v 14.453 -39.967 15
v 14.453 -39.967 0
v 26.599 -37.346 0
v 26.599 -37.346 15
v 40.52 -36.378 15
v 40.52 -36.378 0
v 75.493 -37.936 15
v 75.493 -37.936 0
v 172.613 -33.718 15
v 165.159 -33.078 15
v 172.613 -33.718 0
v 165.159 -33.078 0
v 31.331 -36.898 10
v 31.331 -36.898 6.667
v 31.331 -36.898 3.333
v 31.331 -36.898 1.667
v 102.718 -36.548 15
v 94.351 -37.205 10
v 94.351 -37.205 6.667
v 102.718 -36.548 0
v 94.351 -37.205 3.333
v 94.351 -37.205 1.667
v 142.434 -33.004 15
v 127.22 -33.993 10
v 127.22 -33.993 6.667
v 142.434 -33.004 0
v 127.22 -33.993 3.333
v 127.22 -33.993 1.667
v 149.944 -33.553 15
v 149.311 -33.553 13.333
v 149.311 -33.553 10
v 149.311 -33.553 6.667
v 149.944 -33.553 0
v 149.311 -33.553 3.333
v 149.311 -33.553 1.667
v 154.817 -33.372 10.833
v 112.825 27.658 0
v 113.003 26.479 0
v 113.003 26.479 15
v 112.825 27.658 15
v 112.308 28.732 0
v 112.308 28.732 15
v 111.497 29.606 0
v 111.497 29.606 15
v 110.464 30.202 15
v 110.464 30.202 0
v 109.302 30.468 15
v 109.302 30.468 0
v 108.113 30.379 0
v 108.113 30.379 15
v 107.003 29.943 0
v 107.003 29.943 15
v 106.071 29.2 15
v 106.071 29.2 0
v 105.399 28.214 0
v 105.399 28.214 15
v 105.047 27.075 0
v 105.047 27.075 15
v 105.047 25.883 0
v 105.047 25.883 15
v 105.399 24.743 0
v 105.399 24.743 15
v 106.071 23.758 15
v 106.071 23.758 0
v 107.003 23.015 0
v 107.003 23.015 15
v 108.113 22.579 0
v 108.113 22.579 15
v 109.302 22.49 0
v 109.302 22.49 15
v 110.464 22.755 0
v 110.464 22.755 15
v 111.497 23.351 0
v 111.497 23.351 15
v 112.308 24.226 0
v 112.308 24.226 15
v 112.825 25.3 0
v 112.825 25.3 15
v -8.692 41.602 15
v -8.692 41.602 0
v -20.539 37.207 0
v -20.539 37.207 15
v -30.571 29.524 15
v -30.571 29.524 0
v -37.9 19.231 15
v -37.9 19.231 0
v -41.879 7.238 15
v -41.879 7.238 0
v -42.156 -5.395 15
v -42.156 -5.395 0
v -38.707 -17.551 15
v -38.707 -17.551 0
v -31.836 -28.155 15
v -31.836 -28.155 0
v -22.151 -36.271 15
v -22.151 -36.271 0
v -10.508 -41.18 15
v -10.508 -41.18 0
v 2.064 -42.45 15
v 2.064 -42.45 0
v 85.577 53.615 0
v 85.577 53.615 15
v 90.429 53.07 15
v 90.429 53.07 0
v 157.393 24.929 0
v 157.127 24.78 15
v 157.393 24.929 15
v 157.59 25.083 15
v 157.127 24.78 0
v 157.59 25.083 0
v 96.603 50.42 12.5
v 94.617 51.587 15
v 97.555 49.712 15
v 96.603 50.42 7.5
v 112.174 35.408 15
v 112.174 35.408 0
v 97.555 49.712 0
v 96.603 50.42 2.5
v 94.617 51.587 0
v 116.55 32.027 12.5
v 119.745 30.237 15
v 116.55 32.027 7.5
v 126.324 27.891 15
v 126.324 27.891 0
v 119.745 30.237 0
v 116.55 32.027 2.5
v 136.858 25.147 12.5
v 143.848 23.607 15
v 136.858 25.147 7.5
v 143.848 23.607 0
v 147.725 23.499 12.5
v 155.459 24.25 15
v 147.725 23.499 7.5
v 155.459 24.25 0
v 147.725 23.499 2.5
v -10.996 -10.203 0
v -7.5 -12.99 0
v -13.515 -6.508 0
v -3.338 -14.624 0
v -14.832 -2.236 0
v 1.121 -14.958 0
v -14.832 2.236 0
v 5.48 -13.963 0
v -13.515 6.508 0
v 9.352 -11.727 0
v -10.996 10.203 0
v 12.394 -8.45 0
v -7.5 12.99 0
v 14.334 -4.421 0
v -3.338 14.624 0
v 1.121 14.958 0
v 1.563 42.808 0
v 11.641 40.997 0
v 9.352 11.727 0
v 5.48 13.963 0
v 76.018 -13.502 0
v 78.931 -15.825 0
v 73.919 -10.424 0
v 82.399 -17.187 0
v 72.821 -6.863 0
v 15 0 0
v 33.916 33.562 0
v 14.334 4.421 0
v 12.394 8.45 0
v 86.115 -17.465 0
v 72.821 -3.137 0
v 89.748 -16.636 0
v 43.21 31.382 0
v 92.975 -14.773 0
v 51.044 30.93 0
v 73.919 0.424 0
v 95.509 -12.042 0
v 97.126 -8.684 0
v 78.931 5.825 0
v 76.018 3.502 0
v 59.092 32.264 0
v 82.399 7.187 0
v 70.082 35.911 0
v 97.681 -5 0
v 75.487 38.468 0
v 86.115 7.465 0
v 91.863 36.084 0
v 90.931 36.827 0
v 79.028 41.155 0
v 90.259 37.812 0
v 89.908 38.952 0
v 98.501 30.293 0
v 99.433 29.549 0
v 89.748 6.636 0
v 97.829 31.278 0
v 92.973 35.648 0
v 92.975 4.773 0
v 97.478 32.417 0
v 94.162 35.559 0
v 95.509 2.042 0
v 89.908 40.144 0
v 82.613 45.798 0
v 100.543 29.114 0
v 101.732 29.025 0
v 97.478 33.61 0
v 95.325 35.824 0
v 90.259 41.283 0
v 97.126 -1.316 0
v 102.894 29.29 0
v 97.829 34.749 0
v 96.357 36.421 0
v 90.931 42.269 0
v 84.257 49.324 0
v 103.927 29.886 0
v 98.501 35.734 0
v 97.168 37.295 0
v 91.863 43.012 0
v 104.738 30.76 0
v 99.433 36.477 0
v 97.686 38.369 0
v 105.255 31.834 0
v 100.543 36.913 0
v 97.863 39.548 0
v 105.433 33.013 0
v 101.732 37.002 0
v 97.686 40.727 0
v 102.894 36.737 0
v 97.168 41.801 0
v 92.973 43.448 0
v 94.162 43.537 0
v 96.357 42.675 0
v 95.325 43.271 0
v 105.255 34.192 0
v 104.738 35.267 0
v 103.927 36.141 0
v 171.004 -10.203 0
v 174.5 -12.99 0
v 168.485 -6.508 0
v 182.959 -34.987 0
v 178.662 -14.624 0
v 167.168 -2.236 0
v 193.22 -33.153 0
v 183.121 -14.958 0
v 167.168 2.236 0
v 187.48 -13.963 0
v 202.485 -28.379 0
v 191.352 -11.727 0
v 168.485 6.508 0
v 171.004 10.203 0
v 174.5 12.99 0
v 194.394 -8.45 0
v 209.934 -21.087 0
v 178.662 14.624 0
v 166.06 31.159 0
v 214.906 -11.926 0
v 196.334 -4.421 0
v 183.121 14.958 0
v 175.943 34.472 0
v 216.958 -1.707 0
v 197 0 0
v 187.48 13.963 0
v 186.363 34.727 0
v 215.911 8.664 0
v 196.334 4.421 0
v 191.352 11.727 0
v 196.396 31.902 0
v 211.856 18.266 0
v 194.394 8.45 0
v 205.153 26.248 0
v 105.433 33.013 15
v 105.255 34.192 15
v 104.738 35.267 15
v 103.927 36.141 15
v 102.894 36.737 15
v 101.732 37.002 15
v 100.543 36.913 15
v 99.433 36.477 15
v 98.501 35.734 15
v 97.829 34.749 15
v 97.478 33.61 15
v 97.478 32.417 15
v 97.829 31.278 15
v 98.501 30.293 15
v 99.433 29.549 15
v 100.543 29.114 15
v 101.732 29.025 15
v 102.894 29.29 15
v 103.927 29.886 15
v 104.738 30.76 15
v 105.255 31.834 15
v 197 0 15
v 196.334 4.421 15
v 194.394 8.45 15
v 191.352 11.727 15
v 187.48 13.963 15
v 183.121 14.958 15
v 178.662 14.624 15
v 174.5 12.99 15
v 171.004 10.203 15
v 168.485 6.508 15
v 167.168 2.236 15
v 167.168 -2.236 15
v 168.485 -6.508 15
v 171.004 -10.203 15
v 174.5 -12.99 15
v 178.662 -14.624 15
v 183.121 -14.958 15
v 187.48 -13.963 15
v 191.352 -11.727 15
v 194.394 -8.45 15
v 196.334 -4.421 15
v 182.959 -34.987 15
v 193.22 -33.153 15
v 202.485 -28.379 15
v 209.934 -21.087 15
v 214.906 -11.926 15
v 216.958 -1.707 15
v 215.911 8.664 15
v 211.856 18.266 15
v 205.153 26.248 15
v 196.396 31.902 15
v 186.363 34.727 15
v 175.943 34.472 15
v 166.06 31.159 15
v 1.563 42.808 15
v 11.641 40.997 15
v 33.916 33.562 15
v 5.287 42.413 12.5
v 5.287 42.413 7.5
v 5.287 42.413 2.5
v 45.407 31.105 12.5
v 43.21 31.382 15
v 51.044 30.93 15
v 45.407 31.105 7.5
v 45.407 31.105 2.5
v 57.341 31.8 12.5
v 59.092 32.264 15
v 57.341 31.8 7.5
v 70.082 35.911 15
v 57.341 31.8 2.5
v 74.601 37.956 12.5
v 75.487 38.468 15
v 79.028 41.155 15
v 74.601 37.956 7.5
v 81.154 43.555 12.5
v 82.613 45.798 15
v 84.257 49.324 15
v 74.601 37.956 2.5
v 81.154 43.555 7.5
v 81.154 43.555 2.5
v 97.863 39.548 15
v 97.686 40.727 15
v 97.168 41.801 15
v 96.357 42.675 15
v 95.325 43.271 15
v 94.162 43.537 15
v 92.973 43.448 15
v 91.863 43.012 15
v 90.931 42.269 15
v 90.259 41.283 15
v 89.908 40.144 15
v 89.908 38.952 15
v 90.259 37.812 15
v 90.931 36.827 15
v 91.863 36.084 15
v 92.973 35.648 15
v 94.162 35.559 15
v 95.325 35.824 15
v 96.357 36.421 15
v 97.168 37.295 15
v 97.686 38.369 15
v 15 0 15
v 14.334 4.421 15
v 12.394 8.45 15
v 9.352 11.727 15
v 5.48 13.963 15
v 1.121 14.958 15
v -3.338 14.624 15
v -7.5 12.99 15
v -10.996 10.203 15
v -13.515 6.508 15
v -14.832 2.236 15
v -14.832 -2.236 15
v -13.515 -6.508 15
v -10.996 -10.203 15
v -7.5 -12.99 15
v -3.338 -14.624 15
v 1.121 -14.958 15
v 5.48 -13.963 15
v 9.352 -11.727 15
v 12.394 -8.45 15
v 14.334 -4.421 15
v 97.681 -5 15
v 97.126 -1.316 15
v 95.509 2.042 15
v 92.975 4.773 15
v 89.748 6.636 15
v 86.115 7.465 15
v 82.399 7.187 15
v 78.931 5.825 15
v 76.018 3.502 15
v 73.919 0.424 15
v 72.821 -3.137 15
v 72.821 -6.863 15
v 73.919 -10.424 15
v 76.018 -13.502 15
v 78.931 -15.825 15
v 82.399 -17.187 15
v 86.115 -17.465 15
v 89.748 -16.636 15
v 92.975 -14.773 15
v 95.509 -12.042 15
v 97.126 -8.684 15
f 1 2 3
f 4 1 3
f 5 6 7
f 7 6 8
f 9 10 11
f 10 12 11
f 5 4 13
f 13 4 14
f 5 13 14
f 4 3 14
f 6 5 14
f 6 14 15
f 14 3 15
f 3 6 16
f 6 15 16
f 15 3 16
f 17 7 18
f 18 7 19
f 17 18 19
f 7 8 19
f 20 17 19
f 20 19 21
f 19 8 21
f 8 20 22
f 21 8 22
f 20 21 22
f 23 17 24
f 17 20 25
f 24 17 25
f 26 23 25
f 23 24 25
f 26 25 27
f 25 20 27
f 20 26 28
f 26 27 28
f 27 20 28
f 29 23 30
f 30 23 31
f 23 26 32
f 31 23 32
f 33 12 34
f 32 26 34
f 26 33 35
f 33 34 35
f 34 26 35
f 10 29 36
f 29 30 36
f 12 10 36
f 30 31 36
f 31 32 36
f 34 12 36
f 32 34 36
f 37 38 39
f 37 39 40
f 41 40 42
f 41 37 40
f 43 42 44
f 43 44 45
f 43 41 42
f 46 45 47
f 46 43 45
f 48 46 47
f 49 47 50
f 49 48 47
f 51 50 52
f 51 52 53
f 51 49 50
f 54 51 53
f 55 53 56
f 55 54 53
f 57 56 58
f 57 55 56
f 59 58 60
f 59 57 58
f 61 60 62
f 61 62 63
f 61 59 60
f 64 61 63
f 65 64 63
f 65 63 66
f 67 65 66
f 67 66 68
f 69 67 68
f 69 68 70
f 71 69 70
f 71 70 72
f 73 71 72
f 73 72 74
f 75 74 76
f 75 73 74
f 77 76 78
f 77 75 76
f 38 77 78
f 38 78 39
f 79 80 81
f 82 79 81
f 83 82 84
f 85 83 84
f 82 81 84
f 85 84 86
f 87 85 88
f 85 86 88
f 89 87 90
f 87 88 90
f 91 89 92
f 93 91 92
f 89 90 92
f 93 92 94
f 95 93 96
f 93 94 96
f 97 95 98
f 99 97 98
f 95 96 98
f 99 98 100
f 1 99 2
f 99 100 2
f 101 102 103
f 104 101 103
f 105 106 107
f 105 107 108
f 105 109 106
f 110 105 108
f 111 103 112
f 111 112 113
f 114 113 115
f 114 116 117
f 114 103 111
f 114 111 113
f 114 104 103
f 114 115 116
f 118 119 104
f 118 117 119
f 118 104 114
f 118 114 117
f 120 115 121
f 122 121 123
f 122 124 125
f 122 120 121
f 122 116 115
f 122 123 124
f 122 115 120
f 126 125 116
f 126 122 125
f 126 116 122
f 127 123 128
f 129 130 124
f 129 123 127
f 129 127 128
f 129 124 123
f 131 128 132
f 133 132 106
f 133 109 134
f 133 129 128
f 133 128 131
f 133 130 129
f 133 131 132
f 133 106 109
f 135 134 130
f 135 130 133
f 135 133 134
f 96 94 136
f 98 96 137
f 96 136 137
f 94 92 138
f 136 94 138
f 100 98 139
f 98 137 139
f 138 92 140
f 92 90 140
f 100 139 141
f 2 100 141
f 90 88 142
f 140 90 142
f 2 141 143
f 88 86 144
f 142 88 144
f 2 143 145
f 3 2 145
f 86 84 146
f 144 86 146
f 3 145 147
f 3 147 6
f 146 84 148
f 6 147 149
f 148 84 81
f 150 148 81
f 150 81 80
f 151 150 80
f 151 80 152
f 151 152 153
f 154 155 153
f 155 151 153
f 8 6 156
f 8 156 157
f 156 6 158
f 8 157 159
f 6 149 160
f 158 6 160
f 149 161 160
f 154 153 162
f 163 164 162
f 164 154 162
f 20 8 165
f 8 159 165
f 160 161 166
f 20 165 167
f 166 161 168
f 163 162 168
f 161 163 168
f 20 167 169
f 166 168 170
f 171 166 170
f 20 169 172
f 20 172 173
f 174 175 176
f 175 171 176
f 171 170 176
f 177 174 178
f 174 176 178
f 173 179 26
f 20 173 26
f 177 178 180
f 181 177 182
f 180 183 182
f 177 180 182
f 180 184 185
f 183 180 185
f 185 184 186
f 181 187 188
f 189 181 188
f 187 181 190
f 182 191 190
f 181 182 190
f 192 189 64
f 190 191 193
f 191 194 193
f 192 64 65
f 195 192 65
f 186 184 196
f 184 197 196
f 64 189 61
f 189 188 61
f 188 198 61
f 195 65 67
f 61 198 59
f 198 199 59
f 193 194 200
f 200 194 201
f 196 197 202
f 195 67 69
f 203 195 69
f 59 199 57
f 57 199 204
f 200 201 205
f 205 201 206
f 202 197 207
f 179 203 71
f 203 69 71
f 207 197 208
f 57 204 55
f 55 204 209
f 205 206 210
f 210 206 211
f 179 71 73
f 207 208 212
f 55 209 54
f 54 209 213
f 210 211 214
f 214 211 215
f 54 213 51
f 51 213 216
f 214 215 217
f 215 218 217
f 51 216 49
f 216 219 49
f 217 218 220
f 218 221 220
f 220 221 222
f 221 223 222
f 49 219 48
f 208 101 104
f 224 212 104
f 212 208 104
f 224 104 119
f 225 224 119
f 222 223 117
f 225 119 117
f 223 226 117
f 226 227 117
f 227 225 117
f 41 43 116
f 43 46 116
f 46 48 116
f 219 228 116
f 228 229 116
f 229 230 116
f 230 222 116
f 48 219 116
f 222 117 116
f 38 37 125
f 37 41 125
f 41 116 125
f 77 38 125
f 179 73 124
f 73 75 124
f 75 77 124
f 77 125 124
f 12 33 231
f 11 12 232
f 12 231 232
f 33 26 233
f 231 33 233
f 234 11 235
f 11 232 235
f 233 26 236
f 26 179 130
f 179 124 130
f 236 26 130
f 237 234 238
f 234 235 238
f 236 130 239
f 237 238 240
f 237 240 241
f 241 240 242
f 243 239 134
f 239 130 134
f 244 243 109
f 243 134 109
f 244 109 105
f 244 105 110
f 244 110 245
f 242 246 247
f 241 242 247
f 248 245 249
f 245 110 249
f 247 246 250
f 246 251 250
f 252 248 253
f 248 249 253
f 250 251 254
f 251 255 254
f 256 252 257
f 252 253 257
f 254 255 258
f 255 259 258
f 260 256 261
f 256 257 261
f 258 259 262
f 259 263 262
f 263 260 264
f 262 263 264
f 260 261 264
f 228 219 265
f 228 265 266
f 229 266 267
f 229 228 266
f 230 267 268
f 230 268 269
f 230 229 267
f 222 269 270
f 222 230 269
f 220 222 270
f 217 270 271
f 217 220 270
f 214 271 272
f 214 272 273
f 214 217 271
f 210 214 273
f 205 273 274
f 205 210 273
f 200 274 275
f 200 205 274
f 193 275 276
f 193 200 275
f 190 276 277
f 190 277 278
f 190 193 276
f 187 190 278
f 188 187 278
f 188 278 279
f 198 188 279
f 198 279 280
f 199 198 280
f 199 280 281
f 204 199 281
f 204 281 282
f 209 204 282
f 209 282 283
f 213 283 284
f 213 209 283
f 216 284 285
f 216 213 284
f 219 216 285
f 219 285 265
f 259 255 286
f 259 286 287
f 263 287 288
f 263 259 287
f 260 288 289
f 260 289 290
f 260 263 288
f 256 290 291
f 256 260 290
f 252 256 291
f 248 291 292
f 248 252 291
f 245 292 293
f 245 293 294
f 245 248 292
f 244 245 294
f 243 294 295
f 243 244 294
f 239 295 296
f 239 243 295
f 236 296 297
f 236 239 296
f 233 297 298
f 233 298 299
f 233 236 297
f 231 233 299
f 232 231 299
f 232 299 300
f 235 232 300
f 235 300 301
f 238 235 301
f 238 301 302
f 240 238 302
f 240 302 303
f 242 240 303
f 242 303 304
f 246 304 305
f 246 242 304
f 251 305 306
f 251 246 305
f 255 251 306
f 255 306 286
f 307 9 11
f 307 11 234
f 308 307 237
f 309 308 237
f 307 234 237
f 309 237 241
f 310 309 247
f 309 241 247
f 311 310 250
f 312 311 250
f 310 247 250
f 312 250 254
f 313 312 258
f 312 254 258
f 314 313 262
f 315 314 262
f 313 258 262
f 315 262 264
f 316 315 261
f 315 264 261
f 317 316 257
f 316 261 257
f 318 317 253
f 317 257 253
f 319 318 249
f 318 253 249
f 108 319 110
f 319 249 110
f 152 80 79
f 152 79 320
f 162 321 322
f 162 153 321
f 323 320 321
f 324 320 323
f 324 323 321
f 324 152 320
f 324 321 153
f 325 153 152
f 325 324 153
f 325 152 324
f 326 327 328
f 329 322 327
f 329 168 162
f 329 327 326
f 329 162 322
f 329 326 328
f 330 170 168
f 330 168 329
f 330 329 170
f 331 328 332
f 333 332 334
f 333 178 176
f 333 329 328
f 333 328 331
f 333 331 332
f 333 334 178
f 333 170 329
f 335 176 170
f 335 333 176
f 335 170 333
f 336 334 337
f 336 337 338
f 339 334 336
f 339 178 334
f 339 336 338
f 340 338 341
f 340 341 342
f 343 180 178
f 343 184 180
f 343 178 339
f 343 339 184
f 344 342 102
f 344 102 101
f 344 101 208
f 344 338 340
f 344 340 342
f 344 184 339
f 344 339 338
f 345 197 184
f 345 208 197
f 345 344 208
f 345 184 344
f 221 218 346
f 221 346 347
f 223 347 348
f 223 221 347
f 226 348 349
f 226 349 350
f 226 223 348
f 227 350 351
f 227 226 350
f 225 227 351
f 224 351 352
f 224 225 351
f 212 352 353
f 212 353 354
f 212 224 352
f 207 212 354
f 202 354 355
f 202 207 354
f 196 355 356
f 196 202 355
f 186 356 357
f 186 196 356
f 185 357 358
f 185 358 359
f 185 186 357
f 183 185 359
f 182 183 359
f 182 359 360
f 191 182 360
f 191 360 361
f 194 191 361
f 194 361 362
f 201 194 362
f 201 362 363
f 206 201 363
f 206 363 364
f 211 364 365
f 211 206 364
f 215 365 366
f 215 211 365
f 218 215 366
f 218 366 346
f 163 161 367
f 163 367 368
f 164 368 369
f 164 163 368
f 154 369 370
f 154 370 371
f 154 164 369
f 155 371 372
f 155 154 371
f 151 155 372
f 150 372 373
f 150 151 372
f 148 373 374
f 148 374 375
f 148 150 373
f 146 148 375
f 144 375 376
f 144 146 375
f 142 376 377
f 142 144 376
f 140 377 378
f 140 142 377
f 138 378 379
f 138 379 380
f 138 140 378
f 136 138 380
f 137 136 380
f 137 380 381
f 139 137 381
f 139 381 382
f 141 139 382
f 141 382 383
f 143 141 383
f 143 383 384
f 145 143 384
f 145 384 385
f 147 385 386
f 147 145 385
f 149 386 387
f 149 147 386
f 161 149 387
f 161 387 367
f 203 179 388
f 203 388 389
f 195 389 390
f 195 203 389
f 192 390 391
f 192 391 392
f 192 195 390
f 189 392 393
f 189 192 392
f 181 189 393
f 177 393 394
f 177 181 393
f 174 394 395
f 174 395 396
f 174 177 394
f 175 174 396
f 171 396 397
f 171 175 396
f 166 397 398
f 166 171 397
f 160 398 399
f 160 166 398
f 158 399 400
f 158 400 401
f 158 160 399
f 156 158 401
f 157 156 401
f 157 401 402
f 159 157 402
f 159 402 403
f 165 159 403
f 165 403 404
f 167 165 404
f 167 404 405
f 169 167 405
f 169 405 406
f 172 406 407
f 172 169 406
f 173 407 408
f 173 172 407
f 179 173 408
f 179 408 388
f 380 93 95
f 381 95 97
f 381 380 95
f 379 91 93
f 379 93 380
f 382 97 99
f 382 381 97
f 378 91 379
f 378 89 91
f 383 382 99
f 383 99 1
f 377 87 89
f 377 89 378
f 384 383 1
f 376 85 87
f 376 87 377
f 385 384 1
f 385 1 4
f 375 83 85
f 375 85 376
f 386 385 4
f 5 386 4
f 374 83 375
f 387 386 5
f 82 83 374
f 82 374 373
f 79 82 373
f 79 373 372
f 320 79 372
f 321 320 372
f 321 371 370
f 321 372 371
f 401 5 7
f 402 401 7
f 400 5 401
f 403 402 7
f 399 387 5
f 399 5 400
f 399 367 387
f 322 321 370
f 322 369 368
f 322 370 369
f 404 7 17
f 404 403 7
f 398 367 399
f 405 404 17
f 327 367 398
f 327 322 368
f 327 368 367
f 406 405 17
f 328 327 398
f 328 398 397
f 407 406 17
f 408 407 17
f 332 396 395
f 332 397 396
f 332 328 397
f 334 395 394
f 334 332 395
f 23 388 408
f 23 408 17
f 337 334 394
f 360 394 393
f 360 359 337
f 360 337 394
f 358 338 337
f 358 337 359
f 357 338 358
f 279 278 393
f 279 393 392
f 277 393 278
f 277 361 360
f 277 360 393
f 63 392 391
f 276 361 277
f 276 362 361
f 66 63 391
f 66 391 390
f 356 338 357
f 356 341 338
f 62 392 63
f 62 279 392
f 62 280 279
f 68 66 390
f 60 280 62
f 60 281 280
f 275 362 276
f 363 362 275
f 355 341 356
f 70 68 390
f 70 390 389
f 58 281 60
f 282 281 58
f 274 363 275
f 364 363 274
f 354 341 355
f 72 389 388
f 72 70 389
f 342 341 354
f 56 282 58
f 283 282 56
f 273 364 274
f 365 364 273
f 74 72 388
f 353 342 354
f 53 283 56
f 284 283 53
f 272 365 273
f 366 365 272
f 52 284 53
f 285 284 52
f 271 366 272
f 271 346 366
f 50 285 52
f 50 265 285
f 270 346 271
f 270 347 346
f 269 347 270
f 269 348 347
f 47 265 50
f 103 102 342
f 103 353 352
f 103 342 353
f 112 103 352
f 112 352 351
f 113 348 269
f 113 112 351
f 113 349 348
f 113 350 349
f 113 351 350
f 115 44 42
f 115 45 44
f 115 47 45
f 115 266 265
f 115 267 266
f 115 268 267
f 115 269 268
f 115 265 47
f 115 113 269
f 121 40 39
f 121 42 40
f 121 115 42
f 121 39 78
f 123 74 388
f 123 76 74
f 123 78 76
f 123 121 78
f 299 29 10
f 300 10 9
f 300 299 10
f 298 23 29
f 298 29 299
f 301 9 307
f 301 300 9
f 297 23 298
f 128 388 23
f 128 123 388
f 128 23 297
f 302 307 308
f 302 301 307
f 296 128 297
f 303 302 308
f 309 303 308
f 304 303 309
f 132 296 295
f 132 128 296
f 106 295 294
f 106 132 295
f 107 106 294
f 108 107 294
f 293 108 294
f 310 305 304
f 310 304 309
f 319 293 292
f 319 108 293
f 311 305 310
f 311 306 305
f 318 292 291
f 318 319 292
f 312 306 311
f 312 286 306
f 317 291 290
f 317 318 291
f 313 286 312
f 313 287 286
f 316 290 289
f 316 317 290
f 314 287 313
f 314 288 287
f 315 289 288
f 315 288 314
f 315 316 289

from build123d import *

# Parameters (mm, degrees)
SKETCH1_R           = 15
SKETCH1_R_2         = 12.5
SKETCH1_R_3         = 4
BOSS_EXTRUDE1_DEPTH = 15


with BuildPart() as part:
    # Sketch1 → Boss-Extrude1 (new body)
    with BuildSketch(Plane.XY):
        with BuildLine():
            ThreePointArc((-8.692383901, 41.601592062), (-40.885857936, -11.601578378), (14.453121839, -39.966952212))
            add(Edge.make_bspline(
                [(14.453121839, -39.966952212), (20.324183093, -37.843819), (27.727764191, -37.215036977), (43.472623732, -35.833837226), (58.397602455, -37.276370761), (84.946315016, -38.583245304), (114.704531254, -35.522221035), (142.355688015, -32.171380422), (144.567405538, -33.689959174), (153.929721624, -33.475356197), (168.590787669, -32.59797777), (172.613360968, -33.717814397)],
                knots=[0, 0, 0, 0, 0.11255921, 0.148246658, 0.333693611, 0.392620141, 0.678585426, 0.734324885, 0.894275272, 0.922842164, 1, 1, 1, 1], degree=3))
            ThreePointArc((172.613360968, -33.717814397), (215.91075058, 8.663774875), (157.59040834, 25.083297929))
            add(Edge.make_bspline(
                [(85.576729013, 53.615490069), (89.951099637, 53.597826548), (95.065965871, 51.958379885), (103.617048542, 44.431536157), (117.031089923, 27.951919231), (131.204676748, 27.358750312), (143.43335667, 22.709079443), (156.177574778, 23.708411323), (157.59040834, 25.083297929)],
                knots=[0, 0, 0, 0, 0.13386012, 0.179539567, 0.456794471, 0.762138658, 0.816459211, 1, 1, 1, 1], degree=3))
            add(Edge.make_bspline(
                [(-8.692383901, 41.601592062), (-2.649418853, 42.86423057), (1.654490906, 43.280309596), (17.705998641, 39.789174665), (32.677991729, 32.904373306), (51.236480337, 29.501510111), (71.851804055, 36.549367458), (82.042198718, 39.131213847), (85.576729013, 53.615490069)],
                knots=[0, 0, 0, 0, 0.135925504, 0.178703955, 0.427784514, 0.654064452, 0.711286, 1, 1, 1, 1], degree=3))
        make_face()
        Circle(SKETCH1_R, mode=Mode.SUBTRACT)
        with Locations((182, 0)):
            Circle(SKETCH1_R, mode=Mode.SUBTRACT)
        with Locations((85.180976595, -5)):
            Circle(SKETCH1_R_2, mode=Mode.SUBTRACT)
        with Locations((93.863357503, 39.547847307)):
            Circle(SKETCH1_R_3, mode=Mode.SUBTRACT)
        with Locations((101.433042145, 33.013333215)):
            Circle(SKETCH1_R_3, mode=Mode.SUBTRACT)
        with Locations((109.002726787, 26.478819122)):
            Circle(SKETCH1_R_3, mode=Mode.SUBTRACT)
    extrude(amount=BOSS_EXTRUDE1_DEPTH)


solid = part.part
